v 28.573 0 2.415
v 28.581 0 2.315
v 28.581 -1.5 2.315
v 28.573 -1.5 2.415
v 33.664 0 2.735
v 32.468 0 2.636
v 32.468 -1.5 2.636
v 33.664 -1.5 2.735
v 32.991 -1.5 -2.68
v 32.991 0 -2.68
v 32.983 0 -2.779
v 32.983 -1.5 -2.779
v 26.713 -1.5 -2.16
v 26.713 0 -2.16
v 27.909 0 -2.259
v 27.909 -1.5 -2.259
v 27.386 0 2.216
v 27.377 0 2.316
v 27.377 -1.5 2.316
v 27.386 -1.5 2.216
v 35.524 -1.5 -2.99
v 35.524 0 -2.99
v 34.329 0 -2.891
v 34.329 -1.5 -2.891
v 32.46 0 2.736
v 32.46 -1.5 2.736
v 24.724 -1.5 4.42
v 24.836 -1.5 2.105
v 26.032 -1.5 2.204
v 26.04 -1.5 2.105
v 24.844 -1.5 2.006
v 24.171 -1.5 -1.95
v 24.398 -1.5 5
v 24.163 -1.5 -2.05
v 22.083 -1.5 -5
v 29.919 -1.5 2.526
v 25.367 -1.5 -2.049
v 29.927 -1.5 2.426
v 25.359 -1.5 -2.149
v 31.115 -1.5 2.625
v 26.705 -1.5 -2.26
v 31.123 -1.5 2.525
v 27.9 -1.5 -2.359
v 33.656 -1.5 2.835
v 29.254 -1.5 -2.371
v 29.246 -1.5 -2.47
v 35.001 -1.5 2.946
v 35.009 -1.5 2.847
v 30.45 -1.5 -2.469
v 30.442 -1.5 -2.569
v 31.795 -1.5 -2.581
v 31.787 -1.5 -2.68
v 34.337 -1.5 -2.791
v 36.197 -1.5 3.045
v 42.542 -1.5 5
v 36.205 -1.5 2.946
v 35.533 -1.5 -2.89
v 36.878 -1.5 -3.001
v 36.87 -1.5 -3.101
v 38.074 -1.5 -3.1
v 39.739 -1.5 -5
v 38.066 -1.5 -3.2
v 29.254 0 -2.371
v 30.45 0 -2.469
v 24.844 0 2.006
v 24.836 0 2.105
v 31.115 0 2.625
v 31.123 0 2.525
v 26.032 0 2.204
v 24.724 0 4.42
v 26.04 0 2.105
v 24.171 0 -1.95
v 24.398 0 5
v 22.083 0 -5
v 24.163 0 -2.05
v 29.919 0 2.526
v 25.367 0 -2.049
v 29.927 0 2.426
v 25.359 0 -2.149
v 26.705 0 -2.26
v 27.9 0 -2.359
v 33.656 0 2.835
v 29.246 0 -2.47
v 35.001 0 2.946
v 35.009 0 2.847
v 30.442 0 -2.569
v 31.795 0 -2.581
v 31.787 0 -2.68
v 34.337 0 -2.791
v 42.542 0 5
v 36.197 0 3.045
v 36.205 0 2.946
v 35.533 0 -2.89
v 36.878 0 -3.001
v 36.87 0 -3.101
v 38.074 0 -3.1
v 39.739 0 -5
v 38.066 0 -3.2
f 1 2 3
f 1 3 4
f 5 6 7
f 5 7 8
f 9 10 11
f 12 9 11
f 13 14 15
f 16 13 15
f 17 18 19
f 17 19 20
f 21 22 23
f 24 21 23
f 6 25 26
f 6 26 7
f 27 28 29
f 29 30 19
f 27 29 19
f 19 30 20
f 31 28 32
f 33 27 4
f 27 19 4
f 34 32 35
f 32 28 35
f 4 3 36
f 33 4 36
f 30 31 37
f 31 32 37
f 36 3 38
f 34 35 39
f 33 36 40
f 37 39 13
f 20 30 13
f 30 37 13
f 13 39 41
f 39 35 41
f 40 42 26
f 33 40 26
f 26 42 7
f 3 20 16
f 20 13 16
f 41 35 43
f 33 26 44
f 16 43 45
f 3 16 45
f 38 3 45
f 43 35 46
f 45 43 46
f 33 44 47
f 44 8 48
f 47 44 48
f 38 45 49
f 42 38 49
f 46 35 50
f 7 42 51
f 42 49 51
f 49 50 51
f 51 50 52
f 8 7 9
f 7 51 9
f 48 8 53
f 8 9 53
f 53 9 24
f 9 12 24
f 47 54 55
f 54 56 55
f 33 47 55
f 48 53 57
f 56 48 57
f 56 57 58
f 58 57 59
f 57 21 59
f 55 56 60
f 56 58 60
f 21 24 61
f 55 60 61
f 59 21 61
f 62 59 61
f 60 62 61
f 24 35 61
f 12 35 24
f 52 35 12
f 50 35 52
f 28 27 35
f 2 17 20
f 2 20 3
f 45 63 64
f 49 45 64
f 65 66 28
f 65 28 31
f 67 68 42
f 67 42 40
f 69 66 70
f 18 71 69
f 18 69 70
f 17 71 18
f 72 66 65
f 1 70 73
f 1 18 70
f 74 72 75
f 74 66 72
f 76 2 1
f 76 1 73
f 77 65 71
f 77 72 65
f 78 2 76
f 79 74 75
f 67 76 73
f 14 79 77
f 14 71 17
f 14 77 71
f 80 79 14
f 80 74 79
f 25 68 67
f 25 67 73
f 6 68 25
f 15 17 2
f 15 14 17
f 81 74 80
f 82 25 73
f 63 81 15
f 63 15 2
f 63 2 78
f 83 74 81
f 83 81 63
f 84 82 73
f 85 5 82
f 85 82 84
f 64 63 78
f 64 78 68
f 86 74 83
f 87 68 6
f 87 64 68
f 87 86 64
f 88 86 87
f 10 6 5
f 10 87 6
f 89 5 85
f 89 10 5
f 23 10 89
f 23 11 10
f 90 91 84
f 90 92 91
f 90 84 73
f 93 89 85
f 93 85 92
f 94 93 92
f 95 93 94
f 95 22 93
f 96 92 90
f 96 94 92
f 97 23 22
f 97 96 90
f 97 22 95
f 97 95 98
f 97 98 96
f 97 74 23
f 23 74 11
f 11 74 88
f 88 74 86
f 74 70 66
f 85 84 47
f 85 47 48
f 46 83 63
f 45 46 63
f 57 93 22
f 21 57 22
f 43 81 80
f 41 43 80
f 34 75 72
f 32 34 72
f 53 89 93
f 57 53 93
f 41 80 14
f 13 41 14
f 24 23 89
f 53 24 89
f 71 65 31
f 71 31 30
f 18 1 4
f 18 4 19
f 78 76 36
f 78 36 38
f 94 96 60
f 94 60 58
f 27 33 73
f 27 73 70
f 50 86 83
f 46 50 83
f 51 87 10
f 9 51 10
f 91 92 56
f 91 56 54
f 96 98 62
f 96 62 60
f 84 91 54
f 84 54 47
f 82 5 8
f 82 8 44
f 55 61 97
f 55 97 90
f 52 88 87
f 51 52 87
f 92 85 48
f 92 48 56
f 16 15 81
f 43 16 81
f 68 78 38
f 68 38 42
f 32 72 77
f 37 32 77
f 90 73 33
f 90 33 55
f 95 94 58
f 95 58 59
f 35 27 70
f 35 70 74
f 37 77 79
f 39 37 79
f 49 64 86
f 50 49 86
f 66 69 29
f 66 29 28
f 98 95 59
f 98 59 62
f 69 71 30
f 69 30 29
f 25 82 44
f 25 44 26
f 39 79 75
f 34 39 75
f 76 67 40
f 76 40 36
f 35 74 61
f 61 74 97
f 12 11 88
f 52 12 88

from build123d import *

# Parameters (mm, degrees)
ESQUISSE1_W                 = 33
ESQUISSE1_H                 = 10
ESQUISSE1_R                 = 1
EXTRUSION1_DEPTH            = 1.5
ENL_V_START                 = -1.5
ENL_V_MAT_EXTRU_1_OUTLINE_R = 1
ENL_V_MAT_EXTRU_1_DEPTH     = 1.5


# Read off the part's stored shape, not the designer's step: Enlèv. mat.-Extru.1
with BuildPart() as part:
    # Esquisse1 → Extrusion1 (new body)
    with BuildSketch(Plane(origin=(0, 0, 0), x_dir=(1, 0, 0), z_dir=(0, 1, 0))):
        with Locations((29.365732097, 0)):
            Rectangle(ESQUISSE1_W, ESQUISSE1_H)
        with Locations(Location((42.865732097, 0, 0), (0, 0, 270))):
            Circle(ESQUISSE1_R, mode=Mode.SUBTRACT)
        with Locations(Location((15.865732097, 0, 0), (0, 0, 270))):
            Circle(ESQUISSE1_R, mode=Mode.SUBTRACT)
        Polygon((36.878065896, 3.001382291), (36.86981937, 3.101041684), (38.065732097, 3.2), (38.073978624, 3.100340606), align=None, mode=Mode.SUBTRACT)
        Polygon((34.328504824, 2.890755264), (34.33675135, 2.79109587), (35.532664078, 2.890054186), (35.524417551, 2.989713579), align=None, mode=Mode.SUBTRACT)
        Polygon((31.787190278, 2.680468843), (31.795436804, 2.580809449), (32.991349532, 2.679767765), (32.983103005, 2.779427159), align=None, mode=Mode.SUBTRACT)
        Polygon((29.245875732, 2.470182423), (29.254122258, 2.370523029), (30.450034986, 2.469481345), (30.44178846, 2.569140738), align=None, mode=Mode.SUBTRACT)
        Polygon((26.704561186, 2.259896002), (26.712807712, 2.160236608), (27.90872044, 2.259194924), (27.900473914, 2.358854318), align=None, mode=Mode.SUBTRACT)
        Polygon((24.16324664, 2.049609582), (24.171493166, 1.949950188), (25.367405894, 2.048908503), (25.359159368, 2.148567897), align=None, mode=Mode.SUBTRACT)
        Polygon((21.621932094, 1.839323161), (21.630178621, 1.739663767), (22.826091348, 1.838622083), (22.817844822, 1.938281477), align=None, mode=Mode.SUBTRACT)
        Polygon((19.080617548, 1.629036741), (19.088864075, 1.529377347), (20.284776802, 1.628335662), (20.276530276, 1.727995056), align=None, mode=Mode.SUBTRACT)
        Polygon((22.294666135, -1.894989955), (22.302912661, -1.795330561), (23.498825389, -1.894288877), (23.490578862, -1.993948271), align=None, mode=Mode.SUBTRACT)
        Polygon((27.377295227, -2.315562796), (27.385541753, -2.215903402), (28.581454481, -2.314861718), (28.573207954, -2.414521112), align=None, mode=Mode.SUBTRACT)
        Polygon((32.459924319, -2.736135637), (32.468170845, -2.636476244), (33.664083572, -2.735434559), (33.655837046, -2.835093953), align=None, mode=Mode.SUBTRACT)
        Polygon((35.001238865, -2.946422058), (35.009485391, -2.846762664), (36.205398118, -2.94572098), (36.197151592, -3.045380374), align=None, mode=Mode.SUBTRACT)
        Polygon((29.918609773, -2.525849217), (29.926856299, -2.426189823), (31.122769027, -2.525148139), (31.1145225, -2.624807532), align=None, mode=Mode.SUBTRACT)
        Polygon((24.835980681, -2.105276376), (24.844227207, -2.005616982), (26.040139935, -2.104575297), (26.031893408, -2.204234691), align=None, mode=Mode.SUBTRACT)
        Polygon((19.753351589, -1.684703535), (19.761598115, -1.585044141), (20.957510843, -1.684002456), (20.949264317, -1.78366185), align=None, mode=Mode.SUBTRACT)
    extrude(amount=-EXTRUSION1_DEPTH)

    # Enlèv. mat.-Extru.1 outline → Enlèv. mat.-Extru.1 (cut)
    # profile 1 of 2: a face of its own
    with BuildSketch(Plane(origin=(0, 0, 0), x_dir=(1, 0, 0), z_dir=(0, 1, 0)).offset(ENL_V_START)):
        Polygon((24.723817468, -4.419702073), (22.083186059, 5), (12.865732097, 5), (12.865732097, -5), (24.397634062, -5), align=None)
        Polygon((20.949264317, -1.78366185), (19.753351589, -1.684703535), (19.761598115, -1.585044141), (20.957510843, -1.684002456), align=None, mode=Mode.SUBTRACT)
        Polygon((23.490578862, -1.993948271), (22.294666135, -1.894989955), (22.302912661, -1.795330561), (23.498825389, -1.894288877), align=None, mode=Mode.SUBTRACT)
        with Locations((15.865732097, 0)):
            Circle(ENL_V_MAT_EXTRU_1_OUTLINE_R, mode=Mode.SUBTRACT)
        Polygon((19.080617548, 1.629036741), (20.276530276, 1.727995056), (20.284776802, 1.628335662), (19.088864075, 1.529377347), align=None, mode=Mode.SUBTRACT)
        Polygon((21.621932094, 1.839323161), (22.817844822, 1.938281477), (22.826091348, 1.838622083), (21.630178621, 1.739663767), align=None, mode=Mode.SUBTRACT)
    # profile 2 of 2: a face of its own
    with BuildSketch(Plane(origin=(0, 0, 0), x_dir=(1, 0, 0), z_dir=(0, 1, 0)).offset(ENL_V_START)):
        Polygon((45.865732097, 5), (39.738529372, 5), (42.541836089, -5), (45.865732097, -5), align=None)
        with Locations((42.865732097, 0)):
            Circle(ENL_V_MAT_EXTRU_1_OUTLINE_R, mode=Mode.SUBTRACT)
    extrude(amount=ENL_V_MAT_EXTRU_1_DEPTH, mode=Mode.SUBTRACT)


solid = part.part
